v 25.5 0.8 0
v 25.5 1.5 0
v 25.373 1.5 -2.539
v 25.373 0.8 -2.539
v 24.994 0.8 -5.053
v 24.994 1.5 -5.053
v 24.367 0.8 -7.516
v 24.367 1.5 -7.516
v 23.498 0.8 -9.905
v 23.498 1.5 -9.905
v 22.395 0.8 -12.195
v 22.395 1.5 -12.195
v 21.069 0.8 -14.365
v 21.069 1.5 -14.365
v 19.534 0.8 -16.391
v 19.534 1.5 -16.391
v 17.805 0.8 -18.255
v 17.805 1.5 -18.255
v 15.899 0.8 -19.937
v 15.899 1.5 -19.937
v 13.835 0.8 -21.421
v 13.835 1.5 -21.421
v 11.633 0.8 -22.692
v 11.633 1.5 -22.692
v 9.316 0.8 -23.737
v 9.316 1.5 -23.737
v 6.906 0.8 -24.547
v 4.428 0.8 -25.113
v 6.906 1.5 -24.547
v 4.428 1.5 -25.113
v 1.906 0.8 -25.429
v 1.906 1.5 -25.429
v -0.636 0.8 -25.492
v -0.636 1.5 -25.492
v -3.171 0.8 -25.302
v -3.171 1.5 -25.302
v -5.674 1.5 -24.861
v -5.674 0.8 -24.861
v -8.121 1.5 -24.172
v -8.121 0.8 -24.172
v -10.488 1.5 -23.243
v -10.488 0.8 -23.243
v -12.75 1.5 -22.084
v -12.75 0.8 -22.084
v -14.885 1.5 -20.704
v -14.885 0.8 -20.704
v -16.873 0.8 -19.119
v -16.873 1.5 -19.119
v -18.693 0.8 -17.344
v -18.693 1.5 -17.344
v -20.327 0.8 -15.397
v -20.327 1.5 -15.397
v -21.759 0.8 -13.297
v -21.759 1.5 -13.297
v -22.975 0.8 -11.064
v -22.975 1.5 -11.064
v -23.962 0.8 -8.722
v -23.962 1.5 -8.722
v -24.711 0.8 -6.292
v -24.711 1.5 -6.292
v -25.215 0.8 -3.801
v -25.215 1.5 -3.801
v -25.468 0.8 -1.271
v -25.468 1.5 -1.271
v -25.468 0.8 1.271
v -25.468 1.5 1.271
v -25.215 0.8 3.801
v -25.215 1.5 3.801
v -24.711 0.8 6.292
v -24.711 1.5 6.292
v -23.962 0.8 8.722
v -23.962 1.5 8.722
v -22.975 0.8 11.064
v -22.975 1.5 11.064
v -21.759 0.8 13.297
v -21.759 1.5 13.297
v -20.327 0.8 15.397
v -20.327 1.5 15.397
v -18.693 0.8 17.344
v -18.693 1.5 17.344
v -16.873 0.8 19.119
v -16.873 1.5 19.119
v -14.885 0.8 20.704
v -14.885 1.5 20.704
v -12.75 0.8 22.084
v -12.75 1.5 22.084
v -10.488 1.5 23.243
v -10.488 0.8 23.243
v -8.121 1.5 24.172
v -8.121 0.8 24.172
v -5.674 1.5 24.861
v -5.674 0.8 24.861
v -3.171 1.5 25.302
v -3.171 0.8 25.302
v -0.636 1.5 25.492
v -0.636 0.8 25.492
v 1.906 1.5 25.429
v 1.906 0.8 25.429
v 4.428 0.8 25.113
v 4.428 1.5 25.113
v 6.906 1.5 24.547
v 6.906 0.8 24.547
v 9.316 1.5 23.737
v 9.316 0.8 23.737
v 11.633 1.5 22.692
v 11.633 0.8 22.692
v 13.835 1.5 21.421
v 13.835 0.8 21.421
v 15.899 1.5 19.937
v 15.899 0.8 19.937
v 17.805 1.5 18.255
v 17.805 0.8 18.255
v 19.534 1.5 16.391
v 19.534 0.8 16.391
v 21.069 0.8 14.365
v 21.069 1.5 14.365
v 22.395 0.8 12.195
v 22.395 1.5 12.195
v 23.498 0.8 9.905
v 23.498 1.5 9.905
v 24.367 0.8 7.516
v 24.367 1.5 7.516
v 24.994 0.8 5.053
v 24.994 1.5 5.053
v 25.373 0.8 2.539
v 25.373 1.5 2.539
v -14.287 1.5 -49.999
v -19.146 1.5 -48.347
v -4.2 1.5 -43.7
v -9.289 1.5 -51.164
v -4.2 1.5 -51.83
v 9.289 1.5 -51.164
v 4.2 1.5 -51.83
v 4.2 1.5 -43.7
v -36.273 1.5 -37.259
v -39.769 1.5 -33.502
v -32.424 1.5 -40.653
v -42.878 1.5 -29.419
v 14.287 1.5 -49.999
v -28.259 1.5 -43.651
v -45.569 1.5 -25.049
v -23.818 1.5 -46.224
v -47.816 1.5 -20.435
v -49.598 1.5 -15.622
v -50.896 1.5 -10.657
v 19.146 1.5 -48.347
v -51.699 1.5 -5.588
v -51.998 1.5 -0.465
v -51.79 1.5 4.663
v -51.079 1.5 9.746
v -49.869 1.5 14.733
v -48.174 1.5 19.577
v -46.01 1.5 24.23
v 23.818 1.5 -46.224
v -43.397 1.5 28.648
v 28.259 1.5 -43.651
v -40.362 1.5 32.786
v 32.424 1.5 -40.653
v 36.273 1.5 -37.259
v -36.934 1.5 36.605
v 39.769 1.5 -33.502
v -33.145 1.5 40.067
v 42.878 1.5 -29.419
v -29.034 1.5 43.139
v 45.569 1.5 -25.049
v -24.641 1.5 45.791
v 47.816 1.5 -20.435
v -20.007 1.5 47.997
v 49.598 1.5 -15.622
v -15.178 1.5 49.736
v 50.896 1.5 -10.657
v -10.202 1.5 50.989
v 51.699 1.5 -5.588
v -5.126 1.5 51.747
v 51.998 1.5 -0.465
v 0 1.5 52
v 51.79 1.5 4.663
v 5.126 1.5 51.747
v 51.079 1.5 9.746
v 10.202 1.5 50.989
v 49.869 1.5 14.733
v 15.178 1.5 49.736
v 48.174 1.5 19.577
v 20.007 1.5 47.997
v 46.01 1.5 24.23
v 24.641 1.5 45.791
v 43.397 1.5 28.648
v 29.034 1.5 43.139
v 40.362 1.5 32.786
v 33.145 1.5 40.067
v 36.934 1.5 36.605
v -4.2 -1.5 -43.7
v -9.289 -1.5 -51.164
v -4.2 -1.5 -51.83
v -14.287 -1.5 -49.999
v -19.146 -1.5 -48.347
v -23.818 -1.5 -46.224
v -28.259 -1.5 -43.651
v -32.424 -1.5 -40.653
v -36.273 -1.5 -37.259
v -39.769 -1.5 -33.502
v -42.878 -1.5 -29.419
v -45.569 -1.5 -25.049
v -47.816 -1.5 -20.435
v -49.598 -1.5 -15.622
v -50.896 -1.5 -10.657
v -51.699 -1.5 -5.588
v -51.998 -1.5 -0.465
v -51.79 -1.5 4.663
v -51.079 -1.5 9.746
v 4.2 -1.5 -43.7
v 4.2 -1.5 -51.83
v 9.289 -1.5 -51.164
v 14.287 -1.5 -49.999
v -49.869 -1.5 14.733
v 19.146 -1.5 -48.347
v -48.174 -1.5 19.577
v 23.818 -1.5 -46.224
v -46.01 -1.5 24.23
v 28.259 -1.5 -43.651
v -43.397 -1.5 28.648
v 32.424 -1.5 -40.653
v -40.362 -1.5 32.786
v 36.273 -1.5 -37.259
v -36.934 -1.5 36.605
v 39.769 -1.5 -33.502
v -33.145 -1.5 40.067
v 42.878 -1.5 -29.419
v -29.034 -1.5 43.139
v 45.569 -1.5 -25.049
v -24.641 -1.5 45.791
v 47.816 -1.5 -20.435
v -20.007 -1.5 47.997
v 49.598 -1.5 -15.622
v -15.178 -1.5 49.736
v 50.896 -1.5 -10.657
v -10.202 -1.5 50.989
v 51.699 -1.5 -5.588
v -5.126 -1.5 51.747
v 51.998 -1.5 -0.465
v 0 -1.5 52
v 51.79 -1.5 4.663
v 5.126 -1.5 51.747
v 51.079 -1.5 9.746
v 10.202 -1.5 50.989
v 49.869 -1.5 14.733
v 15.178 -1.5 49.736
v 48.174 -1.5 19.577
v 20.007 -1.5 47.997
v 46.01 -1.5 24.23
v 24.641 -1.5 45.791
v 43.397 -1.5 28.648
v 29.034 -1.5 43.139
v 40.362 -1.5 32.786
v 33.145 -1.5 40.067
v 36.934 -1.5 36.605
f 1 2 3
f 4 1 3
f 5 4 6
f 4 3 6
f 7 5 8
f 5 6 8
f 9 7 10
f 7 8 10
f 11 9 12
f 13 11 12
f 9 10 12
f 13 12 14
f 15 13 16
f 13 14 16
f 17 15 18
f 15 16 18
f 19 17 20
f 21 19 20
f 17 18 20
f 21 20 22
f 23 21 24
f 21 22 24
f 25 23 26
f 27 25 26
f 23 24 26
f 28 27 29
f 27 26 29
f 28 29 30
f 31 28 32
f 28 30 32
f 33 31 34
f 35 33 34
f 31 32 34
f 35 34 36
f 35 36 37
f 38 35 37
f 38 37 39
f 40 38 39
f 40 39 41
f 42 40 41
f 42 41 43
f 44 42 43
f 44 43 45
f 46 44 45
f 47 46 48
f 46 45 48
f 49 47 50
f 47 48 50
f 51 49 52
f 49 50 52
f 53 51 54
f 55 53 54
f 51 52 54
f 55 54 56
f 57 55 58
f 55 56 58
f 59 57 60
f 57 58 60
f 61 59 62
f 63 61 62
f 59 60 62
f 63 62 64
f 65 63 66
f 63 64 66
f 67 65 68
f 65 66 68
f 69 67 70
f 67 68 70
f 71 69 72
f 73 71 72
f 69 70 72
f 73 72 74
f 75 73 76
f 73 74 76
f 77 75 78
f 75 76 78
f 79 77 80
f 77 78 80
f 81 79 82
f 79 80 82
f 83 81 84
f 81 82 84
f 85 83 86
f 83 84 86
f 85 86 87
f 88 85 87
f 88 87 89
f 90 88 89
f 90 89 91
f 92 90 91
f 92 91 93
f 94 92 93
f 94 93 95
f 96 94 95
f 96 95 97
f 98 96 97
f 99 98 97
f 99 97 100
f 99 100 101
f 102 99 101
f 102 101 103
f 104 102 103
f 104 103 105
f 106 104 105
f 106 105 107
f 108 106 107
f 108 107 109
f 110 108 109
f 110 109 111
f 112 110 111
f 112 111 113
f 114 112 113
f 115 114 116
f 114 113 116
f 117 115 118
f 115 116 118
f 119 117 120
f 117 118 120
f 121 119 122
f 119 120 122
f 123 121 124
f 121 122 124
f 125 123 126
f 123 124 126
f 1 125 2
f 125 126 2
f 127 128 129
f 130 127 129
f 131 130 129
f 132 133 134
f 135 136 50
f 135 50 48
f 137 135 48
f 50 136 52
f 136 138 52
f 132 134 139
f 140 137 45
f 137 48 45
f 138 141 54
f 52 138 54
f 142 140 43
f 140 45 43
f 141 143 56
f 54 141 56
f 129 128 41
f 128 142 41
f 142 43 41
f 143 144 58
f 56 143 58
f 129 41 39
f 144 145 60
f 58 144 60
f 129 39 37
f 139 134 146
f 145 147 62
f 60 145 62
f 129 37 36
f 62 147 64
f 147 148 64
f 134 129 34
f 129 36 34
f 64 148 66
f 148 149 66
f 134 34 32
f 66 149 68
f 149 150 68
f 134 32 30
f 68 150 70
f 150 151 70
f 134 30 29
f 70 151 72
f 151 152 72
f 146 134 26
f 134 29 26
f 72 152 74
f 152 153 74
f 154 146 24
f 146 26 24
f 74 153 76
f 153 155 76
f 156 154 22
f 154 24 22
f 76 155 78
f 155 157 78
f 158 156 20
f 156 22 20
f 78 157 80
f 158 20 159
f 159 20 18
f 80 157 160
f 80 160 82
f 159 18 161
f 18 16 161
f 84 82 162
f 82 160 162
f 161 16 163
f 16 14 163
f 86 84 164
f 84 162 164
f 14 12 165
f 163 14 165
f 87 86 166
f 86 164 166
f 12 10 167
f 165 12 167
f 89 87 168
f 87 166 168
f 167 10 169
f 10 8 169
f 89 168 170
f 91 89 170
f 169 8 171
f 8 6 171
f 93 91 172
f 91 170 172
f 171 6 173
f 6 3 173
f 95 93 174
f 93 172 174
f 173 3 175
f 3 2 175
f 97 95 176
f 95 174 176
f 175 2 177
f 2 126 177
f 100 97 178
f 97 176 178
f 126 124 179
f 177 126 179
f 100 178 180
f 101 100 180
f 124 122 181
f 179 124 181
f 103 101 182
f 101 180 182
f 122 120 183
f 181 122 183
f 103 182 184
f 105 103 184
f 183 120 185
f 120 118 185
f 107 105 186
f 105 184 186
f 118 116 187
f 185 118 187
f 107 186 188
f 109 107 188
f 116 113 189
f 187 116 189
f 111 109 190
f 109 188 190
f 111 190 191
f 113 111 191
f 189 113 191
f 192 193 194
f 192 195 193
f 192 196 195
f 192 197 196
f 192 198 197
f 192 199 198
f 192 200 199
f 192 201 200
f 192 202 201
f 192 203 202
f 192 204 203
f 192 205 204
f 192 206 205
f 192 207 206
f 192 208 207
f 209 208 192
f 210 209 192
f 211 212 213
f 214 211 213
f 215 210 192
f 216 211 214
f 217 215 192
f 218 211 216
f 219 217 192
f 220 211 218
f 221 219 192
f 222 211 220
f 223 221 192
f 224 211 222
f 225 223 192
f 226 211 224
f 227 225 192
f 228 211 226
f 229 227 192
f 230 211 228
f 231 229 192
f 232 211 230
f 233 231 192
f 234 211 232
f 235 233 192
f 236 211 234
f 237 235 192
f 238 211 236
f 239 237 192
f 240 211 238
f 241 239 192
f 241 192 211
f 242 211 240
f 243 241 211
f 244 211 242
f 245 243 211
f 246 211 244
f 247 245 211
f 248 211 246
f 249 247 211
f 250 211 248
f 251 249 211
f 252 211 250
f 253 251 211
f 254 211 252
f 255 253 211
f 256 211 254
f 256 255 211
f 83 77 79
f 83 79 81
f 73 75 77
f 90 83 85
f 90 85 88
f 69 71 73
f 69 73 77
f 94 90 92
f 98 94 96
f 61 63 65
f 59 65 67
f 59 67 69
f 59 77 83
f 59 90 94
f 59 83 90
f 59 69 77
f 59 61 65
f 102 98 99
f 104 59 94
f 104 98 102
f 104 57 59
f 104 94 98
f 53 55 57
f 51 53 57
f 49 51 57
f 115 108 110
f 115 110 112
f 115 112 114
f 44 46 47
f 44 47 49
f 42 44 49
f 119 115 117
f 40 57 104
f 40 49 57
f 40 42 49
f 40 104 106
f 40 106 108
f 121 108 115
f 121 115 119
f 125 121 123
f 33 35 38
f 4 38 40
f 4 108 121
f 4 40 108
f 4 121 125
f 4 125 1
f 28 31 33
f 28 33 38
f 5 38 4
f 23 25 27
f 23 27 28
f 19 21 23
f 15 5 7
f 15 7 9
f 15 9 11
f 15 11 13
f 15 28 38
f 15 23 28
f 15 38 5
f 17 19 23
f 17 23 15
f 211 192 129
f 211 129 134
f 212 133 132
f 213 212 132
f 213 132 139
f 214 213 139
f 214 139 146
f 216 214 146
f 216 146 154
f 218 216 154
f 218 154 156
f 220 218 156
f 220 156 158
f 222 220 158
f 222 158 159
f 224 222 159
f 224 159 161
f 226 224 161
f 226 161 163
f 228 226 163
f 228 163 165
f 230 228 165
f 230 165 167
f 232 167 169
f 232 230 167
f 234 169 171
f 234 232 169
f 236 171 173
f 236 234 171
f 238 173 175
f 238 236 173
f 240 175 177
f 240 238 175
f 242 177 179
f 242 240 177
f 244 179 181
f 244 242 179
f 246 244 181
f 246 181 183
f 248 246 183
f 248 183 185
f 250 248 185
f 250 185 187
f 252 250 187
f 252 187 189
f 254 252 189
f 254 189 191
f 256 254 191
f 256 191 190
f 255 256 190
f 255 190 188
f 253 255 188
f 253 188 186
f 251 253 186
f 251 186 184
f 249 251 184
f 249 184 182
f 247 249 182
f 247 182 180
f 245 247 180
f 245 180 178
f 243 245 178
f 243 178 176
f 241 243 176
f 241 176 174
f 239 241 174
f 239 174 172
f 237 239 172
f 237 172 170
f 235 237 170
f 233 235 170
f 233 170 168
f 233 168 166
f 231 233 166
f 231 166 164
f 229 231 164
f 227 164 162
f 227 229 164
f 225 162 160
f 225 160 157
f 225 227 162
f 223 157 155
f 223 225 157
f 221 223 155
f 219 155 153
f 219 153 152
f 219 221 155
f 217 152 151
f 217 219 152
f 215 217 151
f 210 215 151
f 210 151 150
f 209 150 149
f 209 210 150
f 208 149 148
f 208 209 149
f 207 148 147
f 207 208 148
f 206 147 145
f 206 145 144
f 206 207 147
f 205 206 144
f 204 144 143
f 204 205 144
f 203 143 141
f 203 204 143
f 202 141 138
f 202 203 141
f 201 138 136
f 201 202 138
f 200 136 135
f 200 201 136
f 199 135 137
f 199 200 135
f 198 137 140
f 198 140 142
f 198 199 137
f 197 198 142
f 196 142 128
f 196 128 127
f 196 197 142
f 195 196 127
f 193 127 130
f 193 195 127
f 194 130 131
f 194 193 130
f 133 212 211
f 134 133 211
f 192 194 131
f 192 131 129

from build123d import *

# Parameters (mm, degrees)
SKETCH007_R     = 52
PAD004_DEPTH    = 1.5
SKETCH008_R     = 25.5
POCKET001_DEPTH = 0.7
SKETCH010_W     = 8.4
SKETCH010_H     = 9
POCKET002_DEPTH = 10


with BuildPart() as part:
    # Sketch007 → Pad004 (new body, symmetric)
    with BuildSketch(Plane.XZ):
        Circle(SKETCH007_R)
    extrude(amount=PAD004_DEPTH, both=True)

    # Sketch008 (on Face2 of Pad004) → Pocket001 (cut)
    with BuildSketch(Plane(origin=(0, 1.5, 0), x_dir=(1, 0, 0), z_dir=(0, 1, 0))):
        Circle(SKETCH008_R)
    extrude(amount=-POCKET001_DEPTH, mode=Mode.SUBTRACT)

    # Sketch010 (on Face3 of Pocket001) → Pocket002 (cut)
    with BuildSketch(Plane.XZ.offset(1.5)):
        with Locations((0, -48.2)):
            Rectangle(SKETCH010_W, SKETCH010_H)
    extrude(amount=-POCKET002_DEPTH, mode=Mode.SUBTRACT)


solid = part.part
